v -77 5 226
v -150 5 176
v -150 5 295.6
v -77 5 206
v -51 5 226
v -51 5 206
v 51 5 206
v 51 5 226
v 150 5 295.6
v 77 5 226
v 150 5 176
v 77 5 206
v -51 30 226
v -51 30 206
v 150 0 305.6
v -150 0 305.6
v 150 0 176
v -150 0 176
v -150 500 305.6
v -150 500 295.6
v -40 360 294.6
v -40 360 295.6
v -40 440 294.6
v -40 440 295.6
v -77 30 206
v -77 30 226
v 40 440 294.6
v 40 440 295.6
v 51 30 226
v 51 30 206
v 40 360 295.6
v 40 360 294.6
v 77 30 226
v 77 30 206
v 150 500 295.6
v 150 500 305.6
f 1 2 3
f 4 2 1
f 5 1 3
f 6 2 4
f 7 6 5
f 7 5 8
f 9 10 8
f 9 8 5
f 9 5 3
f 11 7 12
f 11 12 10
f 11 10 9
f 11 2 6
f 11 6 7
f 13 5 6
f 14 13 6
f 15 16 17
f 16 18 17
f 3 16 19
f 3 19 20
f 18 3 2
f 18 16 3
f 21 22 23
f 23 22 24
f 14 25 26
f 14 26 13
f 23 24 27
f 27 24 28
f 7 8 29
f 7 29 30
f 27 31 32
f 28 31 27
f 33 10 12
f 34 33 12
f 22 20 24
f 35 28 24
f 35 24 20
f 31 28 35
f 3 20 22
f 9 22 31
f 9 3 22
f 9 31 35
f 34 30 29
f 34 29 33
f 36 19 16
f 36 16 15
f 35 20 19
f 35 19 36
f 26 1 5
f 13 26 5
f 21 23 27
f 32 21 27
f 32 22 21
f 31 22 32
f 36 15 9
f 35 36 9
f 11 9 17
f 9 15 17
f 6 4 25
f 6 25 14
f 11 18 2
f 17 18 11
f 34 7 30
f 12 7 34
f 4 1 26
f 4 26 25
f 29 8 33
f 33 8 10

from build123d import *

# Parameters (mm, degrees)
SK_DOCKBASE_W         = 300
SK_DOCKBASE_H         = 129.6
EX_DOCKBASE_DEPTH     = 5
SK_DOCKWALL_W         = 300
SK_DOCKWALL_H         = 10
EX_DOCKWALL_DEPTH     = 500
SK_APRILTAG_W         = 80
SK_APRILTAG_H         = 80
EX_APRILTAG_DEPTH     = 1
SK_DOCKCONTACTS_W     = 26
SK_DOCKCONTACTS_H     = 20
EX_DOCKCONTACTS_DEPTH = 25


with BuildPart() as part:
    # SK_DockBase → EX_DockBase (new body)
    with BuildSketch(Plane(origin=(0, 0, 0), x_dir=(1, 0, 0), z_dir=(0, 1, 0))):
        with Locations((0, -240.8)):
            Rectangle(SK_DOCKBASE_W, SK_DOCKBASE_H)
    extrude(amount=EX_DOCKBASE_DEPTH)

    # SK_DockWall → EX_DockWall (add)
    with BuildSketch(Plane(origin=(0, 0, 0), x_dir=(1, 0, 0), z_dir=(0, 1, 0))):
        with Locations((0, -300.6)):
            Rectangle(SK_DOCKWALL_W, SK_DOCKWALL_H)
    extrude(amount=EX_DOCKWALL_DEPTH)

    # SK_AprilTag → EX_AprilTag (add)
    with BuildSketch(Plane.XY.offset(295.6)):
        with Locations((0, 400)):
            Rectangle(SK_APRILTAG_W, SK_APRILTAG_H)
    extrude(amount=-EX_APRILTAG_DEPTH)

    # SK_DockContacts → EX_DockContacts (add)
    with BuildSketch(Plane(origin=(0, 5, 0), x_dir=(1, 0, 0), z_dir=(0, 1, 0))):
        with Locations((64, -216)):
            Rectangle(SK_DOCKCONTACTS_W, SK_DOCKCONTACTS_H)
        with Locations((-64, -216)):
            Rectangle(SK_DOCKCONTACTS_W, SK_DOCKCONTACTS_H)
    extrude(amount=EX_DOCKCONTACTS_DEPTH)


solid = part.part
